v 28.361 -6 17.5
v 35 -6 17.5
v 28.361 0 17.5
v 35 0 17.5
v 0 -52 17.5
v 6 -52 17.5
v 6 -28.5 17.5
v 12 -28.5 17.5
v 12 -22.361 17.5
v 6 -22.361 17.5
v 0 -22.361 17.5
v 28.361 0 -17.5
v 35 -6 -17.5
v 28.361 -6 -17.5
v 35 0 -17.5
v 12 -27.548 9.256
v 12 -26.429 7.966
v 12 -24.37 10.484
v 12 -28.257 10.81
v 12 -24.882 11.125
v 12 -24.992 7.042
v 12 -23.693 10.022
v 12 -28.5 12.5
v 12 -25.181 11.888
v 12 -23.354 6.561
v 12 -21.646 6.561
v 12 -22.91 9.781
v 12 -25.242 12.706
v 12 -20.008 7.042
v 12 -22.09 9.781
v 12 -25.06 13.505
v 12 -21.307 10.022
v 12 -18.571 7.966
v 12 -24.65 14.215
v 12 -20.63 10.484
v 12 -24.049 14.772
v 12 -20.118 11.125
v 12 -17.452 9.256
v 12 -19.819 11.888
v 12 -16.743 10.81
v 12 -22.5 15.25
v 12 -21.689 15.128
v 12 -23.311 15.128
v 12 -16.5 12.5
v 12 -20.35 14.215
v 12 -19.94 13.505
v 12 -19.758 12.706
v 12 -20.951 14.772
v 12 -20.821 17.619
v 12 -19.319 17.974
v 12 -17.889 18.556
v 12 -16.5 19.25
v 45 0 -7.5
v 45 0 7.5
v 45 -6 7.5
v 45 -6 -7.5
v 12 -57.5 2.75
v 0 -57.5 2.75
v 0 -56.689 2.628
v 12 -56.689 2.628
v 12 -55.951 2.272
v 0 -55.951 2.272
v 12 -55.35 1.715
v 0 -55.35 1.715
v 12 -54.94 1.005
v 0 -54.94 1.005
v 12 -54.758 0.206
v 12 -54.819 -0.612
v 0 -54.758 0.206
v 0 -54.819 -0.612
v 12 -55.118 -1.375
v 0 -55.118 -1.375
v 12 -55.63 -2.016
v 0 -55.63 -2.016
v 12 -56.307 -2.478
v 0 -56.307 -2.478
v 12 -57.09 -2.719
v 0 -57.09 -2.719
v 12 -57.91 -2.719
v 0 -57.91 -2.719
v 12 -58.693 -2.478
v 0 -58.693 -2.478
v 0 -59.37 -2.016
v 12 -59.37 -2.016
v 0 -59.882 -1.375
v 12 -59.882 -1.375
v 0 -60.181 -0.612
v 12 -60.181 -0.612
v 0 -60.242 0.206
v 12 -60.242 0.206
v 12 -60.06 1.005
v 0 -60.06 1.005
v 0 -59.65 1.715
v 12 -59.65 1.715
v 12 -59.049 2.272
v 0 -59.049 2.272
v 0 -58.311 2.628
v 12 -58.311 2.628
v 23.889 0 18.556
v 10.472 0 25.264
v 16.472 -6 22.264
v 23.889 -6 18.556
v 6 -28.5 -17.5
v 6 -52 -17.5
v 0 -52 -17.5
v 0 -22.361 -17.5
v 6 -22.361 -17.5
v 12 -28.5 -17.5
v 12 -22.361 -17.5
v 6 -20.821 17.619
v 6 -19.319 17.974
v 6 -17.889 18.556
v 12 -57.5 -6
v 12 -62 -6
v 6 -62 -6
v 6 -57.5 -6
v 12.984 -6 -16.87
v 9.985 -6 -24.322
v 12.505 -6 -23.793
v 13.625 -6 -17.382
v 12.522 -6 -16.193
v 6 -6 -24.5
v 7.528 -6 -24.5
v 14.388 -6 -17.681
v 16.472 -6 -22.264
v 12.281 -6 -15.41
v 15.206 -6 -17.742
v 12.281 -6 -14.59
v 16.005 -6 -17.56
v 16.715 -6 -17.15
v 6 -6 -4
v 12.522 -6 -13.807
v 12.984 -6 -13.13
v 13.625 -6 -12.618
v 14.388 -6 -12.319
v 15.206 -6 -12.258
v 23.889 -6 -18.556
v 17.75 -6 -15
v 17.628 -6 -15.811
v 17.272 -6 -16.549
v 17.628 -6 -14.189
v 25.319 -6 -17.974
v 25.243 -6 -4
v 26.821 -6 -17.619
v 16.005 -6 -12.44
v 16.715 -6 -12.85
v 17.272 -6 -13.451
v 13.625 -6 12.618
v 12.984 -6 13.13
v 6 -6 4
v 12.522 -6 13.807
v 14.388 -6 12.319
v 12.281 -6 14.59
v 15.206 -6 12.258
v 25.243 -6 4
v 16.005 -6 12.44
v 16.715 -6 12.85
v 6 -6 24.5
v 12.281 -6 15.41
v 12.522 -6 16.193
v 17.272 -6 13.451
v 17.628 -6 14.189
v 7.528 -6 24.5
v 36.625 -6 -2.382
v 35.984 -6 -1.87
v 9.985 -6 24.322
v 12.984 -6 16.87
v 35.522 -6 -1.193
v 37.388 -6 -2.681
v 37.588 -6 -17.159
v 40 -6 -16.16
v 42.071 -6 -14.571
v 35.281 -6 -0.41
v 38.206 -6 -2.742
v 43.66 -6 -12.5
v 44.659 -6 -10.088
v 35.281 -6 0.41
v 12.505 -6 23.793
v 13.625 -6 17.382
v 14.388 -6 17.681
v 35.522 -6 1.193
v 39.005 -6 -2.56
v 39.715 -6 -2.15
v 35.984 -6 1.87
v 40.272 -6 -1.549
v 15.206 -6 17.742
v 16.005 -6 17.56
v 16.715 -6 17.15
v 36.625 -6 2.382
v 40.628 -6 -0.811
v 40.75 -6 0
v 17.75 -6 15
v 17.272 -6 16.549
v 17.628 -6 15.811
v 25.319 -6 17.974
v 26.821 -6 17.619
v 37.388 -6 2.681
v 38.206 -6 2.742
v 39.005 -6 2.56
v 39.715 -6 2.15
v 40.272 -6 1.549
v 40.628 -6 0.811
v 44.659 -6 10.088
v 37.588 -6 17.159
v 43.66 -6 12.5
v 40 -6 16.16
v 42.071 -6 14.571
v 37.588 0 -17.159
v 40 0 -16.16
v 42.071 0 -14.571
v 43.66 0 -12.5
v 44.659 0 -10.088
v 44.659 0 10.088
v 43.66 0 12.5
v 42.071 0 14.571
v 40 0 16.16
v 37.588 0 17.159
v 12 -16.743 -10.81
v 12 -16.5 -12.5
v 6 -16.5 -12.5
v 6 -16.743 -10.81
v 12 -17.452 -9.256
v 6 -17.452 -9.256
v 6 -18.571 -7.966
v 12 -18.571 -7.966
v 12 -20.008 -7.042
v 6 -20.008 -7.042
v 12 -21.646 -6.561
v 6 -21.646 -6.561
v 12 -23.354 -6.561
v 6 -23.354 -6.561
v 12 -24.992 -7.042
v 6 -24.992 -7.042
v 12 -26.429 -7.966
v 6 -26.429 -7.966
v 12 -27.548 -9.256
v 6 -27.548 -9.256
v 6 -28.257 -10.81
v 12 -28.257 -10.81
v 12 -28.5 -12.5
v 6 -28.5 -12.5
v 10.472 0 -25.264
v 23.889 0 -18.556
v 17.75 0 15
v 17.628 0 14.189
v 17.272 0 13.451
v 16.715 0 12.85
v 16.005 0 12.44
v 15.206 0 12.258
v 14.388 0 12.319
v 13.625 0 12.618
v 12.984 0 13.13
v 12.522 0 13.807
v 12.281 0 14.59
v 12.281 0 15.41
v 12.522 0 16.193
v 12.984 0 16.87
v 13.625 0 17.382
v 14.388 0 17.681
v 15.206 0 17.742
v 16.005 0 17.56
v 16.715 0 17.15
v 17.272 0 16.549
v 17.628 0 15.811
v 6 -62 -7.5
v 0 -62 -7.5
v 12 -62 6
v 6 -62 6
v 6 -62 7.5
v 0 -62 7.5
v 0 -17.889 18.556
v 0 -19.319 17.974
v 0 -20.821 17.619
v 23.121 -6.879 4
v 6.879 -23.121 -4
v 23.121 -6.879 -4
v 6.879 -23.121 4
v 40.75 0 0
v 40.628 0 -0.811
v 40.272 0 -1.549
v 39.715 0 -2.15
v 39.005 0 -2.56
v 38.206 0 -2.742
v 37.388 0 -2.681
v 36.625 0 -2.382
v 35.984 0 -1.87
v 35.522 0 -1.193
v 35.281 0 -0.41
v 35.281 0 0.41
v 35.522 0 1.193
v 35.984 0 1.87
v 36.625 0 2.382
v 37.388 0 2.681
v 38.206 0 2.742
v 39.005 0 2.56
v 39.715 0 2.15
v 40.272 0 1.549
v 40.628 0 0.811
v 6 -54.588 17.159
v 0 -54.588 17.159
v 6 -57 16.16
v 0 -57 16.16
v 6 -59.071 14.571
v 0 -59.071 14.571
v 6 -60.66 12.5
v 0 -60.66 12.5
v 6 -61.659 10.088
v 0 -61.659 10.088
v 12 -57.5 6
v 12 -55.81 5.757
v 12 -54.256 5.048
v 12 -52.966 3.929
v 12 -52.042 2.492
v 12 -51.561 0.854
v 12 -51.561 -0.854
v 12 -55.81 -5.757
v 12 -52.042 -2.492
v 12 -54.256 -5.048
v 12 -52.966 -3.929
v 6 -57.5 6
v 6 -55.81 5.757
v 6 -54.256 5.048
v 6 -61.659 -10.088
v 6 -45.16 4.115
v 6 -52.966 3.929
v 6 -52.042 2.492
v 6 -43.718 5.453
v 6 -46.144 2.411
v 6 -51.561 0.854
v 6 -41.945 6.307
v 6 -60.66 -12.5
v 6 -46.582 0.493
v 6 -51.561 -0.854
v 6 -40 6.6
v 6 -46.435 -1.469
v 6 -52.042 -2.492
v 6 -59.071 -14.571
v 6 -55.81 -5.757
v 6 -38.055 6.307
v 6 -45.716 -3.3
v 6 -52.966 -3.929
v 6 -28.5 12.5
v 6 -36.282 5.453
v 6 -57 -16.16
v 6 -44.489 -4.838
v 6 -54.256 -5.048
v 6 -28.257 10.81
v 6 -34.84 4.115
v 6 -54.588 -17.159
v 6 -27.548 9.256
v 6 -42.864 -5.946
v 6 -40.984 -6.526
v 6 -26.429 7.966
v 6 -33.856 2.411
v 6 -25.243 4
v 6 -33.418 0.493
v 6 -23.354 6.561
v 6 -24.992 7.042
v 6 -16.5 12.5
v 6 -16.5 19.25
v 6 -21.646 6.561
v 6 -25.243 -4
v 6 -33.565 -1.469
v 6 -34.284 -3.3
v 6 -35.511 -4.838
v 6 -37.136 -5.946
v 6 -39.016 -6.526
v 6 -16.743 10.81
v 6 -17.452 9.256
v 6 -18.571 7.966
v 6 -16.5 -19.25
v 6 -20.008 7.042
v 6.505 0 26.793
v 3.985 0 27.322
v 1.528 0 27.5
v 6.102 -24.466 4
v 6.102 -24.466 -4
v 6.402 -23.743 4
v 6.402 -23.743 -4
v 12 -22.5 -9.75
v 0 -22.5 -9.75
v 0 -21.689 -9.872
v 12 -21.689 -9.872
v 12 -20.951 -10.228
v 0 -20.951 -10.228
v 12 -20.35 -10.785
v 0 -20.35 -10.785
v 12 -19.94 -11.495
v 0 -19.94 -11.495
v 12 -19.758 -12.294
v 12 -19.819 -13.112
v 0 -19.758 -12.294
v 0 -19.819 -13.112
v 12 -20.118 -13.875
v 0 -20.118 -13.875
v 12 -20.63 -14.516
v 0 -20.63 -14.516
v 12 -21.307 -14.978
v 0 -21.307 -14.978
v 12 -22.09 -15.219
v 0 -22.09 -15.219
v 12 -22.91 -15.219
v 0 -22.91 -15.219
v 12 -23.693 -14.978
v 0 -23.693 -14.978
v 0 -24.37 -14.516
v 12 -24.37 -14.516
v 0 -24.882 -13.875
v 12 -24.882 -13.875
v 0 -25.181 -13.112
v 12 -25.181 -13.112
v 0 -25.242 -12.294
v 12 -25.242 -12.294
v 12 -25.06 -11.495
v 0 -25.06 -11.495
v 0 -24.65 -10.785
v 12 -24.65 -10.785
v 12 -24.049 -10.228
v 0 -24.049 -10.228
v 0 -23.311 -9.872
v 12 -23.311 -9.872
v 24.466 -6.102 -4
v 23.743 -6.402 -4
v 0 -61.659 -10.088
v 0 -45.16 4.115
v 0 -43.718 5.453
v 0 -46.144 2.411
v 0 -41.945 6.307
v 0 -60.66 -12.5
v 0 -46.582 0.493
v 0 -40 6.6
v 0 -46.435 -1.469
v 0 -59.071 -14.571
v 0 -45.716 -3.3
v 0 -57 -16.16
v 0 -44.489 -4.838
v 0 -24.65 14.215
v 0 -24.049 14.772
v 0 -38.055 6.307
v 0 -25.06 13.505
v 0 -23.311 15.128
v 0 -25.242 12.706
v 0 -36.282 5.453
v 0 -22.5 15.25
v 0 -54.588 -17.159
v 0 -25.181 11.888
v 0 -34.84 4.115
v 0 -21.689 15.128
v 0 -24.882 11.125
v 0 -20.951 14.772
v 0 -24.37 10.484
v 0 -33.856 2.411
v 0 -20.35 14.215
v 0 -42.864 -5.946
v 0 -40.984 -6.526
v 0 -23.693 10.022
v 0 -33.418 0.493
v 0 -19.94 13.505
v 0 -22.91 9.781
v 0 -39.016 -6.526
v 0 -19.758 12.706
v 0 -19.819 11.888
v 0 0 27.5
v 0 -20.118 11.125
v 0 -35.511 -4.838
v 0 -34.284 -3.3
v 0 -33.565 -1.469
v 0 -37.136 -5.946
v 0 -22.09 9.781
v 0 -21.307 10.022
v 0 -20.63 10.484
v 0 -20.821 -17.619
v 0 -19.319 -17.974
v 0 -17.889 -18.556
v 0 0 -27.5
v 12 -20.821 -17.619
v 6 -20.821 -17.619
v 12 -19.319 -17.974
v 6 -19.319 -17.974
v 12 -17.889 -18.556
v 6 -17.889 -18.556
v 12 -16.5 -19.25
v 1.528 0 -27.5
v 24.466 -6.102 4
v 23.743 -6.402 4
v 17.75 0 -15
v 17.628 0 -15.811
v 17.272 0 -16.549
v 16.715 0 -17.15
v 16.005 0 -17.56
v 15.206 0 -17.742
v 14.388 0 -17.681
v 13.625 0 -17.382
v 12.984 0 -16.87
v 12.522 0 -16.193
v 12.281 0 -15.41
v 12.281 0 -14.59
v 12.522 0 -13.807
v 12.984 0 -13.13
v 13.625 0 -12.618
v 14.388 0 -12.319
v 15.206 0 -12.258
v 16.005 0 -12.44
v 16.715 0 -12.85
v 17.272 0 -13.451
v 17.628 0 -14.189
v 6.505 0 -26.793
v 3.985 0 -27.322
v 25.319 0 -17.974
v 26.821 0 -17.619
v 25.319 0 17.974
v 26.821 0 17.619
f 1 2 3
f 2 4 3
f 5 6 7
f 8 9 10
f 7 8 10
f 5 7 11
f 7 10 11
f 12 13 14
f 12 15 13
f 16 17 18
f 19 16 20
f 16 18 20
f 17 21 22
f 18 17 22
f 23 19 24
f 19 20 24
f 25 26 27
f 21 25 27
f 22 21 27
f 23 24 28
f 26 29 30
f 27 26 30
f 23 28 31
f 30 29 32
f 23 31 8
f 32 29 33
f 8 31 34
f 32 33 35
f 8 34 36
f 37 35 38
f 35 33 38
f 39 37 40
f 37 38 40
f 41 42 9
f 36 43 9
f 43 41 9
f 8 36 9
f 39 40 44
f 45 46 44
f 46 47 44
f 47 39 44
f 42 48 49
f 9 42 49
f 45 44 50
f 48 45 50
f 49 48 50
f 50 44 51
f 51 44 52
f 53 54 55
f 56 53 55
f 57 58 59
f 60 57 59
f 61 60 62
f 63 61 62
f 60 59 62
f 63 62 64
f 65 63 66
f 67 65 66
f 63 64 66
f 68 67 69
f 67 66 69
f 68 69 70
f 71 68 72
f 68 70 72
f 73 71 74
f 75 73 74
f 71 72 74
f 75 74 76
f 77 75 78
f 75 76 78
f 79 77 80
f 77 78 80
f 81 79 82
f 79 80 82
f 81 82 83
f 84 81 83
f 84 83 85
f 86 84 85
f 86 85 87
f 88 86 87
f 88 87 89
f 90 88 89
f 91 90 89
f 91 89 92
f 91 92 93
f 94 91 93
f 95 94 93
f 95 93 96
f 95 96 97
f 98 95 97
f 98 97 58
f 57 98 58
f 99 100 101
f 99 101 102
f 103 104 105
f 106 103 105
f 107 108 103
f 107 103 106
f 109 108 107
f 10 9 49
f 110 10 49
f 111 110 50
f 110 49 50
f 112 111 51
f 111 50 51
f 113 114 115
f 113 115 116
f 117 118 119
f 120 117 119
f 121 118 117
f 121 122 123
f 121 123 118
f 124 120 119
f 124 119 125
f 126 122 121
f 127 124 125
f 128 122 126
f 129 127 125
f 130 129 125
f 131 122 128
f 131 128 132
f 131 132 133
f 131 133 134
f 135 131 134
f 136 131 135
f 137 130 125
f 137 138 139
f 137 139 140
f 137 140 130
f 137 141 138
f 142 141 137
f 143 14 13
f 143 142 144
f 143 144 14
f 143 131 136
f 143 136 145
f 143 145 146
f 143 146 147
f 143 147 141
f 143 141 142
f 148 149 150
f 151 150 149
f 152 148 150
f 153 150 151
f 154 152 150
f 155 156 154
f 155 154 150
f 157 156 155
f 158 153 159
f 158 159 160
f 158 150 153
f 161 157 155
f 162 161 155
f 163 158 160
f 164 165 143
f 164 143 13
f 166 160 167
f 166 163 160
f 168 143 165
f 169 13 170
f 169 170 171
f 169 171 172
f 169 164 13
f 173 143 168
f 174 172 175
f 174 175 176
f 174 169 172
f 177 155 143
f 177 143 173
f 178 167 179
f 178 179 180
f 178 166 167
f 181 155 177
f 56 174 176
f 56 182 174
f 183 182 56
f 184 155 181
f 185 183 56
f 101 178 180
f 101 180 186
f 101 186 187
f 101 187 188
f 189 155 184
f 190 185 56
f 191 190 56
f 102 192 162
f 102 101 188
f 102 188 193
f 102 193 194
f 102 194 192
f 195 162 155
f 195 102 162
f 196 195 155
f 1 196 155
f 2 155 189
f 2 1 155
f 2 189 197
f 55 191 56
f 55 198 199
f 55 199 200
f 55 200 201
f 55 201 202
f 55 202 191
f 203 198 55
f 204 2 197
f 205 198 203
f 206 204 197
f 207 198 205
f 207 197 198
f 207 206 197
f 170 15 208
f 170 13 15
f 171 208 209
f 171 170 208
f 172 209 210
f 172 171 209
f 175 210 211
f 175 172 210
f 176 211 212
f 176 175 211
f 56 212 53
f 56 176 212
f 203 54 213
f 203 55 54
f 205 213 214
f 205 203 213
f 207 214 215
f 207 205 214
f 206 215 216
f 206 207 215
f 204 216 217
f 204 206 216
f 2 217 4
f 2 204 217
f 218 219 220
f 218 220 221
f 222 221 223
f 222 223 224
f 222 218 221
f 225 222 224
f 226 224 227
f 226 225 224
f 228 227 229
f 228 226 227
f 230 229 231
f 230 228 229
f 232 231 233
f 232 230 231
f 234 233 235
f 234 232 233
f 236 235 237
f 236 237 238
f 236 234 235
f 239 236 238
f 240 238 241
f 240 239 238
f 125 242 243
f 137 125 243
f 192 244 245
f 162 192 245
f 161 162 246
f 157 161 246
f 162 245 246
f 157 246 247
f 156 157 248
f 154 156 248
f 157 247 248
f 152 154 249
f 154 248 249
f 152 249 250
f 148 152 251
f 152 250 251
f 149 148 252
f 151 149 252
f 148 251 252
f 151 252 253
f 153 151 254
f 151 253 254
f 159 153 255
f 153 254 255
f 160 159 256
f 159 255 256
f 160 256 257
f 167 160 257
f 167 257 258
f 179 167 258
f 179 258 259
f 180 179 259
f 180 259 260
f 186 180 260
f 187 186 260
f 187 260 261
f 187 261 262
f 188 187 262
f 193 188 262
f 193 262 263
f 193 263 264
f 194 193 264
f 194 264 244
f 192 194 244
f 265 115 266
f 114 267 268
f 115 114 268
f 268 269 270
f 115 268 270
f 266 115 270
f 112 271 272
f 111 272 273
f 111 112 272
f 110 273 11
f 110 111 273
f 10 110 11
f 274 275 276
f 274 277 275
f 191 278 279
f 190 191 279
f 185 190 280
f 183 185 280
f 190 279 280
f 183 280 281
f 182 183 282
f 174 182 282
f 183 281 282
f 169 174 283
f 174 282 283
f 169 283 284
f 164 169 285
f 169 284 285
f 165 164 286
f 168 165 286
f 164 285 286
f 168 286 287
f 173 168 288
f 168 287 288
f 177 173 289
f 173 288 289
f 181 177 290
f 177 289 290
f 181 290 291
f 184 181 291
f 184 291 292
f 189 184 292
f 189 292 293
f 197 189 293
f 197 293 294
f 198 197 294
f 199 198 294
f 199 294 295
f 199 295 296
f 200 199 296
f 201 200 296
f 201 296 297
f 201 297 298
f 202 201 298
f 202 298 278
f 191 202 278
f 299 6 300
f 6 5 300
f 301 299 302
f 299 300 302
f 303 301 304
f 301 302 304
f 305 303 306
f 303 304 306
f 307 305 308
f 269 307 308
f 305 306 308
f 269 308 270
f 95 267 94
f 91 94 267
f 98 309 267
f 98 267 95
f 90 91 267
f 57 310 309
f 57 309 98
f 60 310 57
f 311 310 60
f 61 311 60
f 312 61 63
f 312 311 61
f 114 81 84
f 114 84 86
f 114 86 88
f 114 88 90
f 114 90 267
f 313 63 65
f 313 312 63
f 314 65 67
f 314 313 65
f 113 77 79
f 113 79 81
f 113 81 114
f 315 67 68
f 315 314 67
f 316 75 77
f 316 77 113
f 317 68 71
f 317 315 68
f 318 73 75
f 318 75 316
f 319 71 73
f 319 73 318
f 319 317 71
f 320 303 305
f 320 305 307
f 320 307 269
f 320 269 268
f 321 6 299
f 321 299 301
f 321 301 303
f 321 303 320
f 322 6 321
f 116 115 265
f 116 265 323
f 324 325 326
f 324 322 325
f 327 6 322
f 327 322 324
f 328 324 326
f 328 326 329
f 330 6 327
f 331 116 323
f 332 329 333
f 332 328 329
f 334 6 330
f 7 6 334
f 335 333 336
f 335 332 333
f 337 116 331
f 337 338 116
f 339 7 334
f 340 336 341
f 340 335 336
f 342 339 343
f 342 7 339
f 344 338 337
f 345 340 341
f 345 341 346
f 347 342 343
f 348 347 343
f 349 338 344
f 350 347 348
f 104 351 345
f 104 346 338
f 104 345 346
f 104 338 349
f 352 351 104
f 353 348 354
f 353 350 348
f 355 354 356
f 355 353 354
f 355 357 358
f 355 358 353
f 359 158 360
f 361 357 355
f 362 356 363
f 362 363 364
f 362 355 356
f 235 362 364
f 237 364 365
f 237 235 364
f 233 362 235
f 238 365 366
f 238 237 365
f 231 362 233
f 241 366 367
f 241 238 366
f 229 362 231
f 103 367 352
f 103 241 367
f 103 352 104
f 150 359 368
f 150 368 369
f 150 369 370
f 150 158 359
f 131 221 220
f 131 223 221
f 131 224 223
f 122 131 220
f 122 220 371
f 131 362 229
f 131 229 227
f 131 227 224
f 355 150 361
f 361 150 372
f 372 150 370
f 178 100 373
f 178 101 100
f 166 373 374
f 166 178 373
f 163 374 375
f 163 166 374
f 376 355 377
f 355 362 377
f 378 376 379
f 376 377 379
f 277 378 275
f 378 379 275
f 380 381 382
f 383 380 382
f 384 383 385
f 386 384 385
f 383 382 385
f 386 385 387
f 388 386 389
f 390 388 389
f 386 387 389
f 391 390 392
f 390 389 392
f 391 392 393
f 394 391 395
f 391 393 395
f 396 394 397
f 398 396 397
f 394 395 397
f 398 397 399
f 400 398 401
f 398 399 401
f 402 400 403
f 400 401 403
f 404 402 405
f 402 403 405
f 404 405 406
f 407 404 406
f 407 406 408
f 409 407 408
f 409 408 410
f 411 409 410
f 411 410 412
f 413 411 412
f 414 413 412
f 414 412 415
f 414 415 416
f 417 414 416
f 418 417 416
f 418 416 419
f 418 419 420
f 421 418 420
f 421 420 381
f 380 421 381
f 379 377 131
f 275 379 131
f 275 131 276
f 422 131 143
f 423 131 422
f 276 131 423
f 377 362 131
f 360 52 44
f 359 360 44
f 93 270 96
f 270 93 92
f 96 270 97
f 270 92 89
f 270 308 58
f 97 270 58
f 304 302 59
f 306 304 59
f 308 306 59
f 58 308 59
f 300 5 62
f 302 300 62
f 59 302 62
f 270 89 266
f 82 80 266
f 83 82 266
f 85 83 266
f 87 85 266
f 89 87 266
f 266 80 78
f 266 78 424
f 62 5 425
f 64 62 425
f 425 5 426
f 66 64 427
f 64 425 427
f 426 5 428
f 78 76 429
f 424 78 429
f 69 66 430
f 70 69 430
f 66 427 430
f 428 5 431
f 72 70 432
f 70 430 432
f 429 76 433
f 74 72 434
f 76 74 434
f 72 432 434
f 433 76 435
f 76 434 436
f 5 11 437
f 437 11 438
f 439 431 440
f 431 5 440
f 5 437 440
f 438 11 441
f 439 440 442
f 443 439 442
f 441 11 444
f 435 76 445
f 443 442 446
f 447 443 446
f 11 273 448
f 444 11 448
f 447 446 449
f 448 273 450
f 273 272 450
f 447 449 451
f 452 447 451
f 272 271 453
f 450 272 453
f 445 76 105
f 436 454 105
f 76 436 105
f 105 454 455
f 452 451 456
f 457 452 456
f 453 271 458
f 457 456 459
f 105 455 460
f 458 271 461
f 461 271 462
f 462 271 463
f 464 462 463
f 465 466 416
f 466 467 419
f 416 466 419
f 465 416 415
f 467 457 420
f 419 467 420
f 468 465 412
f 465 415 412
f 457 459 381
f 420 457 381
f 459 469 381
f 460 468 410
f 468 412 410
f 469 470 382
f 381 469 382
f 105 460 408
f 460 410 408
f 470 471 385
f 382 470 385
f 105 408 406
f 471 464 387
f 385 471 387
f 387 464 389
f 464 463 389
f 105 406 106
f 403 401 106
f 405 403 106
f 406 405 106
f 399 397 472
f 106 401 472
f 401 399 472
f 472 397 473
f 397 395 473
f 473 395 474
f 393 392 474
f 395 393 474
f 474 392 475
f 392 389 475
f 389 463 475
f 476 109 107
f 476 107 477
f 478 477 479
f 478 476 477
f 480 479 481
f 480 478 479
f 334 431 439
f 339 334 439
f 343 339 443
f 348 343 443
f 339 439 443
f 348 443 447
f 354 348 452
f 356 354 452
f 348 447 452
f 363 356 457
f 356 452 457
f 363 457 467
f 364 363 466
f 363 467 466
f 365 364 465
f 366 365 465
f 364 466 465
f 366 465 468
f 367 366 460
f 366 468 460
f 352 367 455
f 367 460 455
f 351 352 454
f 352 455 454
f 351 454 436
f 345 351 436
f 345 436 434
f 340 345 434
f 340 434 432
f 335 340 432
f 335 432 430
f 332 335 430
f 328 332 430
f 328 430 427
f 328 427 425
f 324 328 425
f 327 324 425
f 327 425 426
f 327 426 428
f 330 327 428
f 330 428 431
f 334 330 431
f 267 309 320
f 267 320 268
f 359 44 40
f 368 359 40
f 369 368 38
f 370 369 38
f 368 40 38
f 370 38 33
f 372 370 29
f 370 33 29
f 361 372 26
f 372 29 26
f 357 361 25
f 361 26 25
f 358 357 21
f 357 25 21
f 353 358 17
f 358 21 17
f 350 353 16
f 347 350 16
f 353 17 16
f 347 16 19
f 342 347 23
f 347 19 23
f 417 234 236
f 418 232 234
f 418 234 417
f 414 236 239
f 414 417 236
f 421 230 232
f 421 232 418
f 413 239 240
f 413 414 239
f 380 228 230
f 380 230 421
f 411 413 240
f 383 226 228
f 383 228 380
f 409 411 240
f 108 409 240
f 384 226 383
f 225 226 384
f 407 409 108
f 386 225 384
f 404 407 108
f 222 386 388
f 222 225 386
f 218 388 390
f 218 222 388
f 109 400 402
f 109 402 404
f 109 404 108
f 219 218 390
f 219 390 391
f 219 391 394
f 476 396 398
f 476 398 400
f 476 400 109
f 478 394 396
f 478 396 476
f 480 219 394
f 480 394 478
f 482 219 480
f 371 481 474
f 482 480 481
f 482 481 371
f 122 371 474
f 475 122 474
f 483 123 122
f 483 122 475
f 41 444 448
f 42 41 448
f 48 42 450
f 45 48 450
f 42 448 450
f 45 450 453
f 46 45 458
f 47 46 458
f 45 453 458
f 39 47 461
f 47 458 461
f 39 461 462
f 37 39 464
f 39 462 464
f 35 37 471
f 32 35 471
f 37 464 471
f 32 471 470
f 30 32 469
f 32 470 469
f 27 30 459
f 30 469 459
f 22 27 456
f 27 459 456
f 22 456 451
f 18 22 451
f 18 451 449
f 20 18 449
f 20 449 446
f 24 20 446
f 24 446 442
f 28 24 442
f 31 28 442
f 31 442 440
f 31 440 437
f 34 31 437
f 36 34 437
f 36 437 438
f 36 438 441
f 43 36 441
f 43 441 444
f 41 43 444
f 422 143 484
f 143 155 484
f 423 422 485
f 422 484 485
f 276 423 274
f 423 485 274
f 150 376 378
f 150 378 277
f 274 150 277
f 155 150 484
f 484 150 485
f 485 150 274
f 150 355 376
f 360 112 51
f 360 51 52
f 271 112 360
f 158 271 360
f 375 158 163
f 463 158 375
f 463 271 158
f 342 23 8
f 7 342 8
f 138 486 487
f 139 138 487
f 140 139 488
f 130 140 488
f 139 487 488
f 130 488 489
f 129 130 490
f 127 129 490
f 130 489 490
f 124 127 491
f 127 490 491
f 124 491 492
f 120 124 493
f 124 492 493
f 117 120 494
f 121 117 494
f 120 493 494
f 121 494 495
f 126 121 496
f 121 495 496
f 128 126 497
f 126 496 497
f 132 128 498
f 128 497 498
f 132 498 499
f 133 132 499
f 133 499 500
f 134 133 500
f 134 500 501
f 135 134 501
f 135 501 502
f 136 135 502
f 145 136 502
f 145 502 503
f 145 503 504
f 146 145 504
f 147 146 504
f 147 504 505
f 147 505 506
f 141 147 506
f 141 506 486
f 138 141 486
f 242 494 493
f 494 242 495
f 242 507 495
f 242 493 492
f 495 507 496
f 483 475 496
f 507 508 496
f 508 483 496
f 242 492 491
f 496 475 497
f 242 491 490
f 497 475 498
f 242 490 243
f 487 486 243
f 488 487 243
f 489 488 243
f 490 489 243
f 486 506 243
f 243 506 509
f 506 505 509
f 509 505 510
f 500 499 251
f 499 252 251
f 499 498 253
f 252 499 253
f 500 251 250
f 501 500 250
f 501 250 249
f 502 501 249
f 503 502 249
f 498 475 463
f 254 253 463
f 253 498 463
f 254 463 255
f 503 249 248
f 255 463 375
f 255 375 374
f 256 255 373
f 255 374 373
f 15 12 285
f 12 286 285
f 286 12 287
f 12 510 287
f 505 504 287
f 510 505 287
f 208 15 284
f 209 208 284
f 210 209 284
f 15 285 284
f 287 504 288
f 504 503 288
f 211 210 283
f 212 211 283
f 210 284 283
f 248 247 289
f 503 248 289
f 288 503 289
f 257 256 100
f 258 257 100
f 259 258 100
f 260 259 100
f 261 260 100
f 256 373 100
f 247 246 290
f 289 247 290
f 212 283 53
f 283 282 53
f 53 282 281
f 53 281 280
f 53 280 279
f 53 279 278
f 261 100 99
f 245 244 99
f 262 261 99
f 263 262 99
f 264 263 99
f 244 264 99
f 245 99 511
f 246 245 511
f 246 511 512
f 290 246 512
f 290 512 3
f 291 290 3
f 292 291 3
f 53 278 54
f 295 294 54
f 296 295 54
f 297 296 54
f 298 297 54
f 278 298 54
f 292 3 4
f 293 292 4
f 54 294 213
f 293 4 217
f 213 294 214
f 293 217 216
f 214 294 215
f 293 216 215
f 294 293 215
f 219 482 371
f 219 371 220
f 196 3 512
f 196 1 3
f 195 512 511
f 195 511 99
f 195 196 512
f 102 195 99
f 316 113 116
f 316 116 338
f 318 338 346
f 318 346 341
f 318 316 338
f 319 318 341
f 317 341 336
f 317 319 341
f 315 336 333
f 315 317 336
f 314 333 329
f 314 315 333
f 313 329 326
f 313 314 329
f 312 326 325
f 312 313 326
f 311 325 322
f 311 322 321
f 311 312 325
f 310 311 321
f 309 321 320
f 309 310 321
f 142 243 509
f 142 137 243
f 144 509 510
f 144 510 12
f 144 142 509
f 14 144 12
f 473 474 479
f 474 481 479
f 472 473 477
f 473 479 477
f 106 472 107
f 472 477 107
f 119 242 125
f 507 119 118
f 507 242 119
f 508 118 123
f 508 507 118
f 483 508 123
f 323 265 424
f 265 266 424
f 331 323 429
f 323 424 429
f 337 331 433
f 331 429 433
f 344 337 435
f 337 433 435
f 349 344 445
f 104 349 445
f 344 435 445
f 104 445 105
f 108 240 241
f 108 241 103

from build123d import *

# Parameters (mm, degrees)
BOSS_EXTRUDE1_DEPTH  = 17.5
SKETCH2_R            = 6.6
CUT_EXTRUDE1_DEPTH   = 20
BOSS_EXTRUDE2_DEPTH  = 4
BOSS_EXTRUDE3_DEPTH  = 6
BOSS_EXTRUDE4_DEPTH  = 6
CUT_EXTRUDE2_DEPTH   = 8
FILLET3_R            = 10
FILLET4_R            = 3
M5_CLEARANCE_HOLE1_D = 5.5
FILLET5_R            = 10
BOSS_EXTRUDE5_START  = 6
BOSS_EXTRUDE5_DEPTH  = 6
M5_CLEARANCE_HOLE2_D = 5.5


with BuildPart() as part:
    # Sketch1 → Boss-Extrude1 (new, symmetric)
    with BuildSketch(Plane.XY):
        Polygon((0, -62), (0, 0), (45, 0), (45, -6), (6, -6), (6, -62), align=None)
    extrude(amount=BOSS_EXTRUDE1_DEPTH, both=True)

    # Sketch2 → Cut-Extrude1 (cut)
    with BuildSketch(Plane.ZY):
        with Locations((0, -40)):
            Circle(SKETCH2_R)
    extrude(amount=-CUT_EXTRUDE1_DEPTH, mode=Mode.SUBTRACT)

    # Sketch3 → Boss-Extrude2 (add, symmetric)
    with BuildSketch(Plane.XY):
        Polygon((6, -24), (24, -6), (6, -6), align=None)
    extrude(amount=BOSS_EXTRUDE2_DEPTH, both=True)

    # Sketch4 → Boss-Extrude3 (add)
    with BuildSketch(Plane.ZY):
        Polygon((17.5, -20), (27.5, 0), (17.5, 0), align=None)
    boss_extrude3 = extrude(amount=-BOSS_EXTRUDE3_DEPTH)

    # Sketch5 → Boss-Extrude4 (add)
    with BuildSketch(Plane(origin=(0, 0, 0), x_dir=(1, 0, 0), z_dir=(0, 1, 0))):
        Polygon((6, -27.5), (26, -17.5), (6, -17.5), align=None)
    boss_extrude4 = extrude(amount=-BOSS_EXTRUDE4_DEPTH)

    # Sketch6 → Cut-Extrude2 (cut)
    with BuildSketch(Plane.ZY.offset(-6)):
        Polygon((27.5, 0), (27.5, -6), (24.5, -6), align=None)
    cut_extrude2 = extrude(amount=-CUT_EXTRUDE2_DEPTH, mode=Mode.SUBTRACT)

    # Mirror2: Boss-Extrude3, Boss-Extrude4, Cut-Extrude2 across plane
    add(boss_extrude3.mirror(Plane.XY))
    add(boss_extrude4.mirror(Plane.XY))
    add(cut_extrude2.mirror(Plane.XY), mode=Mode.SUBTRACT)

    # Fillet3
    fillet3_edges = [part.edges().sort_by_distance(p)[0] for p in [
        (3, -20, 17.5),
        (26, -3, 17.5),
        (9, -3, 26),
        (3, -20, -17.5),
        (26, -3, -17.5),
        (9, -3, -26),
    ]]
    fillet(fillet3_edges, radius=FILLET3_R)

    # Fillet4
    fillet4_edges = [part.edges().sort_by_distance(p)[0] for p in [
        (6, -24, 0),
        (24, -6, 0),
    ]]
    fillet(fillet4_edges, radius=FILLET4_R)

    # M5 Clearance Hole1 (through all)
    with Locations(Plane(origin=(0, -6, 0), x_dir=(-1, 0, 0), z_dir=(0, -1, 0))):
        with Locations((-15, 15), (-15, -15), (-38, 0)):
            Hole(M5_CLEARANCE_HOLE1_D / 2)

    # Fillet5
    fillet5_edges = [part.edges().sort_by_distance(p)[0] for p in [
        (45, -3, 17.5),
        (3, -62, 17.5),
        (45, -3, -17.5),
        (3, -62, -17.5),
    ]]
    fillet(fillet5_edges, radius=FILLET5_R)

    # Sketch11 → Boss-Extrude5 (add)
    with BuildSketch(Plane(origin=(6, 0, 0), x_dir=(0, 0, -1), z_dir=(1, 0, 0)).offset(BOSS_EXTRUDE5_START)):
        with BuildLine():
            Line((17.5, -28.5), (17.5, -22.360679775))
            ThreePointArc((17.5, -22.360679775), (17.767510105, -20.06315057), (18.55572809, -17.88854382))
            Line((18.55572809, -17.88854382), (19.25, -16.5))
            Line((19.25, -16.5), (12.5, -16.5))
            ThreePointArc((12.5, -16.5), (6.5, -22.5), (12.5, -28.5))
            Line((12.5, -28.5), (17.5, -28.5))
        make_face()
        with BuildLine():
            Line((-17.5, -28.5), (-17.5, -22.360679775))
            ThreePointArc((-17.5, -22.360679775), (-17.767510105, -20.06315057), (-18.55572809, -17.88854382))
            Line((-18.55572809, -17.88854382), (-19.25, -16.5))
            Line((-19.25, -16.5), (-12.5, -16.5))
            ThreePointArc((-12.5, -16.5), (-6.5, -22.5), (-12.5, -28.5))
            Line((-12.5, -28.5), (-17.5, -28.5))
        make_face()
        with BuildLine():
            Line((-6, -57.5), (-6, -62))
            Line((-6, -62), (6, -62))
            Line((6, -62), (6, -57.5))
            ThreePointArc((6, -57.5), (0, -51.5), (-6, -57.5))
        make_face()
    extrude(amount=-BOSS_EXTRUDE5_DEPTH)

    # M5 Clearance Hole2 (through all)
    with Locations(Plane(origin=(12, 0, 0), x_dir=(0, 0, -1), z_dir=(1, 0, 0))):
        with Locations((-12.5, -22.5), (12.5, -22.5), (0, -57.5)):
            Hole(M5_CLEARANCE_HOLE2_D / 2)


solid = part.part
